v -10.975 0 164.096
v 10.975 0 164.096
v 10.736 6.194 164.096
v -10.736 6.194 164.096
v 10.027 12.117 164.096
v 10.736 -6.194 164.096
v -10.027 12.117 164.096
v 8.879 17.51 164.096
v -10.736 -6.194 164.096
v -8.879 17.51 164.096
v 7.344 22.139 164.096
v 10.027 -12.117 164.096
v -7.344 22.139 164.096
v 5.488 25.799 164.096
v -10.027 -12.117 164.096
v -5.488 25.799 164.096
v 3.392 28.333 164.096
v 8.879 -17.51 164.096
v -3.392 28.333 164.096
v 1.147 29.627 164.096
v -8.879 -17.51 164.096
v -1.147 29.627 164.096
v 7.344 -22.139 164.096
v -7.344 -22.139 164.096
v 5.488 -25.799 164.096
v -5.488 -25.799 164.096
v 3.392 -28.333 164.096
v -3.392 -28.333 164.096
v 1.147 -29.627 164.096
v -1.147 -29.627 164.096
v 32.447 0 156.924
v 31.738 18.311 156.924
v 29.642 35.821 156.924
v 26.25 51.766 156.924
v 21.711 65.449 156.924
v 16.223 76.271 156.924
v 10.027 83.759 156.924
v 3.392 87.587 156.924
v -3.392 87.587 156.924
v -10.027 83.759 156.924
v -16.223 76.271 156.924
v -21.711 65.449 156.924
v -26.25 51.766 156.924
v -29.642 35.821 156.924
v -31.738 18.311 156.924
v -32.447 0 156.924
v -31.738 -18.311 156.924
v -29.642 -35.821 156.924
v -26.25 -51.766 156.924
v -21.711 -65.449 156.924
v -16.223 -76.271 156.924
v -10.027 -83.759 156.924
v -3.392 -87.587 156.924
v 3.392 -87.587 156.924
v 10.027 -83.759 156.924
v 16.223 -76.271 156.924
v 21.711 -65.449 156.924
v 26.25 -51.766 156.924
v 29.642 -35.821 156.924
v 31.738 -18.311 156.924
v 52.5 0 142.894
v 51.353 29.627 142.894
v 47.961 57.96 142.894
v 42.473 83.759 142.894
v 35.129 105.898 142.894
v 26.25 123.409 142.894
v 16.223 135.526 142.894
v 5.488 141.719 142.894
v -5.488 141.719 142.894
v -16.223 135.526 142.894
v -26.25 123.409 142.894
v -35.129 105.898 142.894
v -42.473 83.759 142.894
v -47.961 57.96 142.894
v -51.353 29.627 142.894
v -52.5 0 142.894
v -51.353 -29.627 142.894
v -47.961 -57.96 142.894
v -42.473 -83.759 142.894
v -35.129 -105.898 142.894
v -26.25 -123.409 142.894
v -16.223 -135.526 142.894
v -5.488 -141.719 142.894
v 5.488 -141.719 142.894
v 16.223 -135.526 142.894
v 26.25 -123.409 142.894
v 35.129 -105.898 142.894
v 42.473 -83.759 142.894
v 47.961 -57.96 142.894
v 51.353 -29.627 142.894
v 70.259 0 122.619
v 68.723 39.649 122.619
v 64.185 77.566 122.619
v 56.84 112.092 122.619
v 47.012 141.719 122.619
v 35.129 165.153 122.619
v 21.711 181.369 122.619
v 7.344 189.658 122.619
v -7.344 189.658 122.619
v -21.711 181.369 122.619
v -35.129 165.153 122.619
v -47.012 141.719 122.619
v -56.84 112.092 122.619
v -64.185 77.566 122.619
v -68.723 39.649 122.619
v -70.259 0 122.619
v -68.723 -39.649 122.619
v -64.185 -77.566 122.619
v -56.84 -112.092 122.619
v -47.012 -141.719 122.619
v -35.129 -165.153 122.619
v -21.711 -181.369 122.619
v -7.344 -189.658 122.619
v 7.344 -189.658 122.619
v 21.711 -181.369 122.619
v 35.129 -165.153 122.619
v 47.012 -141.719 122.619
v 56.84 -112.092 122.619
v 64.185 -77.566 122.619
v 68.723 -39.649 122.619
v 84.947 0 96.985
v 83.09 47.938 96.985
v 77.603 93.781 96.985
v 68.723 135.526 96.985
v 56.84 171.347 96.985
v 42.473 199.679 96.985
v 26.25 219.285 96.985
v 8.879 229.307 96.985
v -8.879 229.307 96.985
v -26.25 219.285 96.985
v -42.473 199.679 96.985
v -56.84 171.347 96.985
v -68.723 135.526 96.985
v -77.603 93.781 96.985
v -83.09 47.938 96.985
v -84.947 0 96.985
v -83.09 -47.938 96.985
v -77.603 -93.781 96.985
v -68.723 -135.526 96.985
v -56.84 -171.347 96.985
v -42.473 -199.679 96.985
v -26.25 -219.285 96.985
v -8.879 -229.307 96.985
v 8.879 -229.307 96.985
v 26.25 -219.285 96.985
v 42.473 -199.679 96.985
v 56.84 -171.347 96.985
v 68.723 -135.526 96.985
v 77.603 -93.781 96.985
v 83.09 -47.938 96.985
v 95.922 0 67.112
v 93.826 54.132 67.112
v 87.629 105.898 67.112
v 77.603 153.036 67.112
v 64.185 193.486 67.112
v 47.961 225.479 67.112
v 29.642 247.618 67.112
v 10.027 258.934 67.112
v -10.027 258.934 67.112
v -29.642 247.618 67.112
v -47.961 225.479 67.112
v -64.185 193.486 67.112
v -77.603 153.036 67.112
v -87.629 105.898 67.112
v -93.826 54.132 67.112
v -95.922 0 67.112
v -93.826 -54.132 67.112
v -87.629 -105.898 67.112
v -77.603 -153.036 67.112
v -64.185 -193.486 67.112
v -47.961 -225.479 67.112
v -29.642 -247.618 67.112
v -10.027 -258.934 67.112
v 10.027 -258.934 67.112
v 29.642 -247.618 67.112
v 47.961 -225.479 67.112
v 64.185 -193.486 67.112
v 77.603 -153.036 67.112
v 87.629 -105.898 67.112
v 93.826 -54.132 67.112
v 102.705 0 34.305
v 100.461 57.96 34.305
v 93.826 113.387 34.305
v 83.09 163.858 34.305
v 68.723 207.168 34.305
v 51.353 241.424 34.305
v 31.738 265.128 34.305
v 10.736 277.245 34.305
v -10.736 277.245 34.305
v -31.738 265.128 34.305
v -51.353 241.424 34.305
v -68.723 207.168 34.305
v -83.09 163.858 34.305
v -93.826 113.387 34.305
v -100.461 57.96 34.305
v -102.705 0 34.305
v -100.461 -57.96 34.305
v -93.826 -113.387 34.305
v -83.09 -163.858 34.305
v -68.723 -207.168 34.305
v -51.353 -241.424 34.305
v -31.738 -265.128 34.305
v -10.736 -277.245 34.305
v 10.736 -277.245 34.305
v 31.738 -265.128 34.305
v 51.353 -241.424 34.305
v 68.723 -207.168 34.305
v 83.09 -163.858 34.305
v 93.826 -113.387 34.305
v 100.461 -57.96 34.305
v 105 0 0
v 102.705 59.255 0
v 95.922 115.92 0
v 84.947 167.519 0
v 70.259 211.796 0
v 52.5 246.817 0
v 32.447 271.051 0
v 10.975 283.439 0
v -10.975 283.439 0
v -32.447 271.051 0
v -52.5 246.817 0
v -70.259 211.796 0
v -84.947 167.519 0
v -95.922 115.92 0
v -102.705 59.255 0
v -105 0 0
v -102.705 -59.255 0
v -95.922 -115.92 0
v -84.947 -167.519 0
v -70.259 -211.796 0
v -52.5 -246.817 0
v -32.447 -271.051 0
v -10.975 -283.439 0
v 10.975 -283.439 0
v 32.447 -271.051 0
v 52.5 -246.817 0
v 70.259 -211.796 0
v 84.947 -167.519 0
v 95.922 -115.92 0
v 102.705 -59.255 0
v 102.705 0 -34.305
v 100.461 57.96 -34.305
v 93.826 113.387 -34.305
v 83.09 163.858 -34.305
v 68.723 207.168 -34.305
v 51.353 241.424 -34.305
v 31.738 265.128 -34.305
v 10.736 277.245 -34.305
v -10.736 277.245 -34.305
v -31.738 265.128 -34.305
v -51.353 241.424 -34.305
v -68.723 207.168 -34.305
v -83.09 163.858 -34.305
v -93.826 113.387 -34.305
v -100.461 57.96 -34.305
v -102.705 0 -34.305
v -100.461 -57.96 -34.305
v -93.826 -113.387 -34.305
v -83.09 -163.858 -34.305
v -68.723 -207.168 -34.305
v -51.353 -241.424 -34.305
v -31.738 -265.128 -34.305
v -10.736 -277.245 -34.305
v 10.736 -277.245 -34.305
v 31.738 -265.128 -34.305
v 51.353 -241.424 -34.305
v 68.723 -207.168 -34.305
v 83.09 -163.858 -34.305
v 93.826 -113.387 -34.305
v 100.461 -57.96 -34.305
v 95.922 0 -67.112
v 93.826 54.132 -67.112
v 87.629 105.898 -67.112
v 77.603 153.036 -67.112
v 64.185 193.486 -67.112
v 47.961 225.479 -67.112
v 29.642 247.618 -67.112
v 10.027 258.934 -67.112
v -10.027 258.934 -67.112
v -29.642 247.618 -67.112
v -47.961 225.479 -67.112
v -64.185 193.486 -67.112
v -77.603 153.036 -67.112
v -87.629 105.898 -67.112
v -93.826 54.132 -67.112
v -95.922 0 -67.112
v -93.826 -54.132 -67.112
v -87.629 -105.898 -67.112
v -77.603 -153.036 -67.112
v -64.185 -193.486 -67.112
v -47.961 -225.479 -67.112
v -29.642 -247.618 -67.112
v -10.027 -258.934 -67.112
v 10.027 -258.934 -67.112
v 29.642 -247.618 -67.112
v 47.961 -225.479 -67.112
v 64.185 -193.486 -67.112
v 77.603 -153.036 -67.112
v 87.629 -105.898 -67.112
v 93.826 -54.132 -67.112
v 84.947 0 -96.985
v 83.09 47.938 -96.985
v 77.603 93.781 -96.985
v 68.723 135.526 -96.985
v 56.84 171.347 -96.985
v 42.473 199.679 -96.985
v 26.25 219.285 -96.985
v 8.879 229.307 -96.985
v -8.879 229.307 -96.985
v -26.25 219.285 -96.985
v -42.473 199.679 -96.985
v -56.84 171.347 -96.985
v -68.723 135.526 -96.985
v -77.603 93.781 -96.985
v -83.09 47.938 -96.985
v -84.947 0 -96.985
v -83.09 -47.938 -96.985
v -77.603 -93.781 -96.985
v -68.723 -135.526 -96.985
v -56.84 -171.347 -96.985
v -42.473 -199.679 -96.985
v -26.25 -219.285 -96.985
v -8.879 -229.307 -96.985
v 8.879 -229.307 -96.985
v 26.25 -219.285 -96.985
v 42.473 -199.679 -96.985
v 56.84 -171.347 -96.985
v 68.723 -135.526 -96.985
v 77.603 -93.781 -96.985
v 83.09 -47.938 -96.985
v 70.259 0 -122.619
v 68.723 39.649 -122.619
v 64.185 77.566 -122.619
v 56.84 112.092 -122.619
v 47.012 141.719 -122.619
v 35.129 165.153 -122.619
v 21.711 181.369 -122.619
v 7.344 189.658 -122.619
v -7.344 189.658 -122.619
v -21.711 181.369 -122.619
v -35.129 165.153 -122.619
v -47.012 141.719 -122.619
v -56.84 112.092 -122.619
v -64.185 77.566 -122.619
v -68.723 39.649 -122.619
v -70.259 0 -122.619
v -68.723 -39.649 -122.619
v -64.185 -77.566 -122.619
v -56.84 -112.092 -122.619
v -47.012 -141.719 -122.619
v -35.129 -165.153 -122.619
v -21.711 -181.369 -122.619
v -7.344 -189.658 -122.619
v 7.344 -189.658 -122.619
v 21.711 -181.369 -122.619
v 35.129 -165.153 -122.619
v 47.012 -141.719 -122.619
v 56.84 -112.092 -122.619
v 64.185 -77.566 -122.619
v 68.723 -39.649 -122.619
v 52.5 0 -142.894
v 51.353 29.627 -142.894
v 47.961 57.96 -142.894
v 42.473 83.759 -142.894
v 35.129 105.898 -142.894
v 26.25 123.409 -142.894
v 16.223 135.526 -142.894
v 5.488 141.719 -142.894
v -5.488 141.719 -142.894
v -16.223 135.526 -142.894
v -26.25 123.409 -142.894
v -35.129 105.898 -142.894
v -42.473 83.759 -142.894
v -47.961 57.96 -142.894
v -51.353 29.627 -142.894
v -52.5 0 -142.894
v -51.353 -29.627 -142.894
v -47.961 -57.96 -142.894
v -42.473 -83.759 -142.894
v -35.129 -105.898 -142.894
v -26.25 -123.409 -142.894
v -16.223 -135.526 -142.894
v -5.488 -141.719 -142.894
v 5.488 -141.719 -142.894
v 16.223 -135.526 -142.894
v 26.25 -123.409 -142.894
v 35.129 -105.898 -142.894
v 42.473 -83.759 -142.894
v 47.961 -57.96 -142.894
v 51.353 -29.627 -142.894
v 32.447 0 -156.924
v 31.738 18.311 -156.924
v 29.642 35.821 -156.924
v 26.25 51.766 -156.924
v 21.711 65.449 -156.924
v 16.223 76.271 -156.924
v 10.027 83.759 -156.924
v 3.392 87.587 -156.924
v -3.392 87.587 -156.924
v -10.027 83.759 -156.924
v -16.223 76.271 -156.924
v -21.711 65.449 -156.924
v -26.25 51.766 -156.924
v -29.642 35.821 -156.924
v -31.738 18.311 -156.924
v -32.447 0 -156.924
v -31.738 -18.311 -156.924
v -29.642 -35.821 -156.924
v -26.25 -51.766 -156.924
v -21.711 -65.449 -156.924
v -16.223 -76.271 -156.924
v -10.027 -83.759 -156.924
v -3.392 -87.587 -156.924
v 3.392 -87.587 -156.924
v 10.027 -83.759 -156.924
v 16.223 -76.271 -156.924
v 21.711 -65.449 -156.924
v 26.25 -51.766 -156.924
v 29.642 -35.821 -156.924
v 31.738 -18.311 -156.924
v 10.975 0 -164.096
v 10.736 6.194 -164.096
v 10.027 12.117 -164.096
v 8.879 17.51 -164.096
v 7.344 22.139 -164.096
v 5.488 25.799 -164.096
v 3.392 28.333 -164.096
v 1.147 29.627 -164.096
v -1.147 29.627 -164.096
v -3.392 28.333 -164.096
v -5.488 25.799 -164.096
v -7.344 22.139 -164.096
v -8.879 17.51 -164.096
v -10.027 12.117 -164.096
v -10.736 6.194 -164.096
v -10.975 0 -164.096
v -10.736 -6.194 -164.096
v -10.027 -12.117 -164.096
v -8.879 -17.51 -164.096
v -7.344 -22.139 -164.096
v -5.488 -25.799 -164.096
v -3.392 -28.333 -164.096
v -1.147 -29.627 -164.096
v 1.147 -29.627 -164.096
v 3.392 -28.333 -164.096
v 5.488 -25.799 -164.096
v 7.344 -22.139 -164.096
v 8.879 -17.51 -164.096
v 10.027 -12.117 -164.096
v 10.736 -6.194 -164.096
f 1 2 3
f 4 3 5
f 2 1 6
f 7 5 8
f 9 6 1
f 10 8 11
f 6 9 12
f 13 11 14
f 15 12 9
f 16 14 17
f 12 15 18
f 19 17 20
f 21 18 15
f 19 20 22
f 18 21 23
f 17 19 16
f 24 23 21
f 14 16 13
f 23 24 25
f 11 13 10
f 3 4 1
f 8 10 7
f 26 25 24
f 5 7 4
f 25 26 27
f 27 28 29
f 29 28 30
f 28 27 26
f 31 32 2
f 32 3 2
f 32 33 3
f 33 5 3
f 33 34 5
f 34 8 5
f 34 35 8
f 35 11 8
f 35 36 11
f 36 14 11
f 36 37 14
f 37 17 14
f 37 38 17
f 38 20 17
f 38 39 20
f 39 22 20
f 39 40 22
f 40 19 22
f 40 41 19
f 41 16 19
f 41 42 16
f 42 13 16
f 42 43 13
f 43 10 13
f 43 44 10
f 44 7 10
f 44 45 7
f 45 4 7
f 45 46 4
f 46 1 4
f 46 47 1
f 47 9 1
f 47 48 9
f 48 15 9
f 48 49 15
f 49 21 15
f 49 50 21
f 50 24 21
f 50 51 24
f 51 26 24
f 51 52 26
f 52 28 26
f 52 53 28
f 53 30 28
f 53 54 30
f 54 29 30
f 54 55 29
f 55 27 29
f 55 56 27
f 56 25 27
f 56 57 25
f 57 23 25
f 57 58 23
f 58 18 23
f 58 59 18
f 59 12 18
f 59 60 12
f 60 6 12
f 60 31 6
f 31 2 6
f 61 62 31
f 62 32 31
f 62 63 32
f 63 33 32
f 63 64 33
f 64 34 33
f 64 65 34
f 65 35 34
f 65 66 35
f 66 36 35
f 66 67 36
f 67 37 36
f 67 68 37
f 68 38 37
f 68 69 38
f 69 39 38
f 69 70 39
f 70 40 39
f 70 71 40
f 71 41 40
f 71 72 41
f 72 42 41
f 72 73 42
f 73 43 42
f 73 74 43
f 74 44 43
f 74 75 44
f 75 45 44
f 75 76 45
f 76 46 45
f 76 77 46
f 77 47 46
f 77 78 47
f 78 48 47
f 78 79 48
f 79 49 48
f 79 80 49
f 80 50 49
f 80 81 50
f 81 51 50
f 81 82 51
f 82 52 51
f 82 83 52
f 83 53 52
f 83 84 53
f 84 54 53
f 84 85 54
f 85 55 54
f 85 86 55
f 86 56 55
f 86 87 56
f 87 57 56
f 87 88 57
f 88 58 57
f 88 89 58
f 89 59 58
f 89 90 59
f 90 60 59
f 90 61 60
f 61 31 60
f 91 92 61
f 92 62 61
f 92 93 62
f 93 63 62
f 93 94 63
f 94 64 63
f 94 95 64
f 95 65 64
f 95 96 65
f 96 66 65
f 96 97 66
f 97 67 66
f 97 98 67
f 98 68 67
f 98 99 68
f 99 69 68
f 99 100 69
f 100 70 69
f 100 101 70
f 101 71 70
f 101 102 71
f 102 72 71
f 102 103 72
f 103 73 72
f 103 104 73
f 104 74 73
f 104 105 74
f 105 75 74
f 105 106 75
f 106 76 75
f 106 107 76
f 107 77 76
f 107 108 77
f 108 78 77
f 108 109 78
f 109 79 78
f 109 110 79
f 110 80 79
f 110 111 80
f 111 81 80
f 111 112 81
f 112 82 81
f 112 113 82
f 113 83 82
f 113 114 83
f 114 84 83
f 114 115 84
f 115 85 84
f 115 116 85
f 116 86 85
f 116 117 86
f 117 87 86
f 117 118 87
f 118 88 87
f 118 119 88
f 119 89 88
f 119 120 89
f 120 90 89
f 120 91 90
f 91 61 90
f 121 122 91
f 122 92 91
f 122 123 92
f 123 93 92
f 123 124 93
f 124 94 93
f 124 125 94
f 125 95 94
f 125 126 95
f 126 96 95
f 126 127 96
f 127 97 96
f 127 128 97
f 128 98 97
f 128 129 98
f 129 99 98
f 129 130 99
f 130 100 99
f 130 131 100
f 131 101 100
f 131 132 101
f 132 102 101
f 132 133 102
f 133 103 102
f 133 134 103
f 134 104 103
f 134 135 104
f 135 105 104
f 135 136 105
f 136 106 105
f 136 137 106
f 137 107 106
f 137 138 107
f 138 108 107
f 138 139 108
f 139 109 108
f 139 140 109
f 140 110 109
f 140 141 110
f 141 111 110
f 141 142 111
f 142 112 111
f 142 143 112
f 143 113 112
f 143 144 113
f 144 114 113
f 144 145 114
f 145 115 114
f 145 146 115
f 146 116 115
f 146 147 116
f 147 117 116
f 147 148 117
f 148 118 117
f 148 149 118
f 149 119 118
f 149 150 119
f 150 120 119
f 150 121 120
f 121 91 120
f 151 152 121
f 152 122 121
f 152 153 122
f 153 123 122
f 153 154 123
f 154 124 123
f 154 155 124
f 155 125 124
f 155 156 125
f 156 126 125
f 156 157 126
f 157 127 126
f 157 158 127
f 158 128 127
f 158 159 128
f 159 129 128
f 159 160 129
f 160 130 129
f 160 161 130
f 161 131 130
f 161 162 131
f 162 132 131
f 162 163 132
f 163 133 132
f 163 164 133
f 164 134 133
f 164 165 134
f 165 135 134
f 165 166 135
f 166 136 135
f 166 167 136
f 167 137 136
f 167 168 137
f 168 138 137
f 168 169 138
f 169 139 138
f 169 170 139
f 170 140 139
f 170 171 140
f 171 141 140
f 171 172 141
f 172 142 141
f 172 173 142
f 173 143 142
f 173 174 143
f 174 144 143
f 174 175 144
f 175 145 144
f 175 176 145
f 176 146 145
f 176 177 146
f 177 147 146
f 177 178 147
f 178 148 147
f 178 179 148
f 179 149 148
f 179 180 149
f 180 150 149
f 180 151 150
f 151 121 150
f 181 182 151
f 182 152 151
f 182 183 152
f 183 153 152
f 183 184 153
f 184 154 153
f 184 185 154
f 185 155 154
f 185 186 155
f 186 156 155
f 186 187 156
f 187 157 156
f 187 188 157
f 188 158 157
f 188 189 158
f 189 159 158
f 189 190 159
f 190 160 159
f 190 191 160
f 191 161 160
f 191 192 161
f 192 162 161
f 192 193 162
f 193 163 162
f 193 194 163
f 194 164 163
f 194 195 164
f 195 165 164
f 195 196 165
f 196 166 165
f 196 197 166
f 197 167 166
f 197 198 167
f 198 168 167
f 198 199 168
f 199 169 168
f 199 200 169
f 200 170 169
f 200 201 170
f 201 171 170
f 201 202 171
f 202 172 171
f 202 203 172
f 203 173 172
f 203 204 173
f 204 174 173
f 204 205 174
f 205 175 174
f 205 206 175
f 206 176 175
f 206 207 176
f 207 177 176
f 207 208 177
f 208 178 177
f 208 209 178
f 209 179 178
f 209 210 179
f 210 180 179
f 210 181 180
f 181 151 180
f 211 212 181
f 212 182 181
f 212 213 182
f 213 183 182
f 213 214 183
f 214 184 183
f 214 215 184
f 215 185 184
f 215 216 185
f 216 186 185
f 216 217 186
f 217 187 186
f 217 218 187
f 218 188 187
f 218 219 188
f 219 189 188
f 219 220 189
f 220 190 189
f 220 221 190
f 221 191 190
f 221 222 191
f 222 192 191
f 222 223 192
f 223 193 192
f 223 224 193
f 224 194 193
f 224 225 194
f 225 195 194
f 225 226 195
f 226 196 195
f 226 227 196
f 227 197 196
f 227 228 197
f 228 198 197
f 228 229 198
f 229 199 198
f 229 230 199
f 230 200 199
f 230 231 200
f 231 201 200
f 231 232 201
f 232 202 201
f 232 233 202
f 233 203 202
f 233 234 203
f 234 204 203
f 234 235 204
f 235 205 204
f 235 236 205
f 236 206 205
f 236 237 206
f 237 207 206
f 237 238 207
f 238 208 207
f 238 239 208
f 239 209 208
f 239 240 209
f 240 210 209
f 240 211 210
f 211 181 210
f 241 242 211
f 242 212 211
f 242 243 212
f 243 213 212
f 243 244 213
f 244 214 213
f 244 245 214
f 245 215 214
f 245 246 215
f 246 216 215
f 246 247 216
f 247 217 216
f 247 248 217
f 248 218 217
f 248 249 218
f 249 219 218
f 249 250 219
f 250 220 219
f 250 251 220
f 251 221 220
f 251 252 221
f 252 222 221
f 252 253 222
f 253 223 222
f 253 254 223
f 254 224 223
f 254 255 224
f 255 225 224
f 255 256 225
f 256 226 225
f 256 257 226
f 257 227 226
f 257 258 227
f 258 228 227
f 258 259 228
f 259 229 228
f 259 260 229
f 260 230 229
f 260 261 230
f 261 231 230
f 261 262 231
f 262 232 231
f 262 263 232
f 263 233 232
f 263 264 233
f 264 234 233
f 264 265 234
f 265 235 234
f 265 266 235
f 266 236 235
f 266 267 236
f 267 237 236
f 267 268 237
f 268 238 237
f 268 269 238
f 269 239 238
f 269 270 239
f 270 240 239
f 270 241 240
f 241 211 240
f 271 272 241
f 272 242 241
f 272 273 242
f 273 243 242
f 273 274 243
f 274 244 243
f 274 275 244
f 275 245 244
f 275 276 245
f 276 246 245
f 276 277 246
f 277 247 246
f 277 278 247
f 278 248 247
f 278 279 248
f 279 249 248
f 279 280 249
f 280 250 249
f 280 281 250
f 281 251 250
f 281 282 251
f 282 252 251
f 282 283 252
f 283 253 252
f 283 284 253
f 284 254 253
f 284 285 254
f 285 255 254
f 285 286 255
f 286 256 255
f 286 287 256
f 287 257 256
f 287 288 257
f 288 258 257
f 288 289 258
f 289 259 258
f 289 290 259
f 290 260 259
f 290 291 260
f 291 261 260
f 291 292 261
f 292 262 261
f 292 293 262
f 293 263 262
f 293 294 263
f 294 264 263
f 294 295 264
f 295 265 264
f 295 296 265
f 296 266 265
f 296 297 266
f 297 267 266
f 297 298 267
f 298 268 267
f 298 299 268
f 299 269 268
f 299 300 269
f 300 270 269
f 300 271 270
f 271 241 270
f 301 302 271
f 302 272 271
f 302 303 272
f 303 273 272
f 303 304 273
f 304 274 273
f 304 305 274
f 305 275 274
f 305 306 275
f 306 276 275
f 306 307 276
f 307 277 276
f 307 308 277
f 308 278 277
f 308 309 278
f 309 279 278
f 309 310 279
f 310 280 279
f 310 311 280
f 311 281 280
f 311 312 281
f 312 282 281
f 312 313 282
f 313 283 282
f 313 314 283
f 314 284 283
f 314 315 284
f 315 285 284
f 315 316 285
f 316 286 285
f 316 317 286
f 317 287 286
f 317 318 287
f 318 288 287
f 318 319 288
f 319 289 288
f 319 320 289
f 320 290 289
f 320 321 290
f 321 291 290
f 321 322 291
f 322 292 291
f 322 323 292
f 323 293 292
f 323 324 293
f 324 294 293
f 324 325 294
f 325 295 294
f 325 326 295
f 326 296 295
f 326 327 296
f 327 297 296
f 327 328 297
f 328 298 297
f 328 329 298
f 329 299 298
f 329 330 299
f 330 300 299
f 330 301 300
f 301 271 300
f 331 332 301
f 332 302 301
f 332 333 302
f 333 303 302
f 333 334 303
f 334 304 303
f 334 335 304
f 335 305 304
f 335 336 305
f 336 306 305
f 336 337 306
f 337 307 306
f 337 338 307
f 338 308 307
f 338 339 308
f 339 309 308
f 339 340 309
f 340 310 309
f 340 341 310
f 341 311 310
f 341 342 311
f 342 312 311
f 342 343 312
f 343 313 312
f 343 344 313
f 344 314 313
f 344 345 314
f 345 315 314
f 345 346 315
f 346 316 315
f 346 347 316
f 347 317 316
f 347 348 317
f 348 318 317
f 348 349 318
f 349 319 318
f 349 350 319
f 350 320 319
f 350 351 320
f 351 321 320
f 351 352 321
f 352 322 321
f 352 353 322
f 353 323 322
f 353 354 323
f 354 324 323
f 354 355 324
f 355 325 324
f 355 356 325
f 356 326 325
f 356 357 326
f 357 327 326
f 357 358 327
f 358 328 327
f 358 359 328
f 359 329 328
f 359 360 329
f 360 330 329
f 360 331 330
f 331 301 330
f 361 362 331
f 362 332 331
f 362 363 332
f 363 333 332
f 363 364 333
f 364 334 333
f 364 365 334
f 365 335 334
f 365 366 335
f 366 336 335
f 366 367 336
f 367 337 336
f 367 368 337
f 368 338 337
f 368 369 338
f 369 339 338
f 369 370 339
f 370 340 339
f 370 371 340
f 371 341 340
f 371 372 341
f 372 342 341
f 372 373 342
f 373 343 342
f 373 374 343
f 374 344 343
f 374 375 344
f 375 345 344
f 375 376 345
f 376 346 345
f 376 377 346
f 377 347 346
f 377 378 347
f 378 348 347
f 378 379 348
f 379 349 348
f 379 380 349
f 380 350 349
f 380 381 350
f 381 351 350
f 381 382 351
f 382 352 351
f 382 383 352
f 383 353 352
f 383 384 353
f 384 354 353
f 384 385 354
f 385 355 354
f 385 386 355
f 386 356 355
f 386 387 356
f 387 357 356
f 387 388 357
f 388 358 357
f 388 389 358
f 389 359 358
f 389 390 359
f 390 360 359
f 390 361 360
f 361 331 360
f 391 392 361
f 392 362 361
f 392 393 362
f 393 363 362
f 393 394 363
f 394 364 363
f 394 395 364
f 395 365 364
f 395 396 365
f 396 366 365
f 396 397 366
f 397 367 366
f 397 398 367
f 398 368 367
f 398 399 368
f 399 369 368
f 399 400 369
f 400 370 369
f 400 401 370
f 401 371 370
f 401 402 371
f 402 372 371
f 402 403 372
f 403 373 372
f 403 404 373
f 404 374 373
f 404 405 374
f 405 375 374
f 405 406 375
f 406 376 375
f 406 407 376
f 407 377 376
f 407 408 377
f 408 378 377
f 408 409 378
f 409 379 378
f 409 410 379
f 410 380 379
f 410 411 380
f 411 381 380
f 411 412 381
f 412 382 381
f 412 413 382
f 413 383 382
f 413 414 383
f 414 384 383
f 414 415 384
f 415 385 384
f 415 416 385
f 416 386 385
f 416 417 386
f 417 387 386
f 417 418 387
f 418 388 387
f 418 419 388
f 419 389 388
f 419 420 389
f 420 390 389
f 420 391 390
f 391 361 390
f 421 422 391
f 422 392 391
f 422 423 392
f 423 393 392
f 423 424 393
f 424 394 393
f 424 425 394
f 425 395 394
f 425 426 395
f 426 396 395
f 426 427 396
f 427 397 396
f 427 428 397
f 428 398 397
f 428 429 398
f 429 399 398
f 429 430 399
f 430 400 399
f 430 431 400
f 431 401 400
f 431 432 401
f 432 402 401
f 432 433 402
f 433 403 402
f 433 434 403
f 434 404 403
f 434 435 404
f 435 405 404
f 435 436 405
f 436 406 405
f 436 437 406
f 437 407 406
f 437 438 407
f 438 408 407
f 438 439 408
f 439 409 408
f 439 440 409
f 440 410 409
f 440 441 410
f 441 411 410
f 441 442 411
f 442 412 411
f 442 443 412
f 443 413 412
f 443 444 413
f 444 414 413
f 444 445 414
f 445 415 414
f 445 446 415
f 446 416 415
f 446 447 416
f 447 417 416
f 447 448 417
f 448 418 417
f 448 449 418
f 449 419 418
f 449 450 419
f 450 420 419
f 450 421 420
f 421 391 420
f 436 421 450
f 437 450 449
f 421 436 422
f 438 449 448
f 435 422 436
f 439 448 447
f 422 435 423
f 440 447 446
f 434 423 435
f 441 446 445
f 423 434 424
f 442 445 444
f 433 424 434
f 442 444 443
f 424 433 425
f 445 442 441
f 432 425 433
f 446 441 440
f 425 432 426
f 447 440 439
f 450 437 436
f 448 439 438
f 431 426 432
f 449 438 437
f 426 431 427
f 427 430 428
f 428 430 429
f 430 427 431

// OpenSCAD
// Generated by SolidPython 1.0.1 on 2020-07-29 00:46:48


scale(v = [7, 19, 11]) {
	sphere(r = 15);
}
/***********************************************
*********      SolidPython code:      **********
************************************************
 
# import packages: SolidPython
from solid import *
from solid.utils import *
from itertools import chain, combinations, permutations


class Resize:

    def __init__(self, scad_file):
        self.scad_file = scad_file
        #self.scad_file = import_scad(scad_file)
        # cone/cylinder param:
        self.r1 = 0
        self.r2 = 0
        self.h = 0
        # rectangular prism param:
        self.w = 0
        self.l = 0
        # ellipse param:
        self.r = 0

    # import OpenScad code (file name corresponds to shape)


    # classify shape + parameters
    def assign(self, param1, param2, param3):
        if self.scad_file == 'cone.scad':
            self.r1 = param1
            self.r2 = param2
            self.h = param3
        elif self.scad_file == 'cylinder.scad':
            self.r1 = param1
            self.r2 = param2
            self.h = param3
        elif self.scad_file == 'rectangularPrism.scad':
            self.h = param1
            self.l = param2
            self.w = param3
        else:
            self.r = param1
            self.h = param2

    # resize parameters
    def iterate(self):
        x = range(3, 20, 2)
        i = 1
        if self.scad_file == 'cone.scad':
            tempList = list(permutations(x, 2))
            for temp in tempList:
                param1 = temp[0]
                param2 = temp[1]
                filepath = 'produced_scad_files/' + 'cone' + str(param1) + '_' + str(param2) + '_' + '.scad'
                scad_render_to_file(cylinder(h=param1, r1=param2, r2=0), filepath)

        elif self.scad_file == 'cylinder.scad':
            tempList = list(permutations(x, 3))
            for temp in tempList:
                param1 = temp[0]
                param2 = temp[1]
                filepath = 'produced_scad_files/' + 'cylinder' + str(param1) + '_' + str(param2) + '_' + '.scad'
                scad_render_to_file(cylinder(h=param1, r1=param2, r2=param2), filepath)

        elif self.scad_file == 'rectangularPrism.scad':
            tempList = list(permutations(x, 3))
            for temp in tempList:
                param1 = temp[0]
                param2 = temp[1]
                param3 = temp[2]
                filepath = 'produced_scad_files/' + 'rectangularPrism' + str(param1) + '_' + str(param2) + '_' + str(
                    param3) + '.scad'
                scad_render_to_file(cube(size=(param1, param2, param3)), filepath)

        elif self.scad_file == 'ellipse.scad':
            tempList = list(permutations(x, 4))
            for temp in tempList:
                param1 = temp[0]
                param2 = temp[1]
                param3 = temp[2]
                param4 = temp[3]
                filepath = 'produced_scad_files/' + 'ellipse' + str(param1) + '_' + str(param2) + '_' + str(param3) + '_' + str(param4) + '.scad'
                scad_render_to_file(scale([param1, param2, param3])(sphere(r=param4)), filepath)

    def render_to_scadfile(self):
        scad_render_to_file(scad, 'example.scad') 
 
************************************************/
